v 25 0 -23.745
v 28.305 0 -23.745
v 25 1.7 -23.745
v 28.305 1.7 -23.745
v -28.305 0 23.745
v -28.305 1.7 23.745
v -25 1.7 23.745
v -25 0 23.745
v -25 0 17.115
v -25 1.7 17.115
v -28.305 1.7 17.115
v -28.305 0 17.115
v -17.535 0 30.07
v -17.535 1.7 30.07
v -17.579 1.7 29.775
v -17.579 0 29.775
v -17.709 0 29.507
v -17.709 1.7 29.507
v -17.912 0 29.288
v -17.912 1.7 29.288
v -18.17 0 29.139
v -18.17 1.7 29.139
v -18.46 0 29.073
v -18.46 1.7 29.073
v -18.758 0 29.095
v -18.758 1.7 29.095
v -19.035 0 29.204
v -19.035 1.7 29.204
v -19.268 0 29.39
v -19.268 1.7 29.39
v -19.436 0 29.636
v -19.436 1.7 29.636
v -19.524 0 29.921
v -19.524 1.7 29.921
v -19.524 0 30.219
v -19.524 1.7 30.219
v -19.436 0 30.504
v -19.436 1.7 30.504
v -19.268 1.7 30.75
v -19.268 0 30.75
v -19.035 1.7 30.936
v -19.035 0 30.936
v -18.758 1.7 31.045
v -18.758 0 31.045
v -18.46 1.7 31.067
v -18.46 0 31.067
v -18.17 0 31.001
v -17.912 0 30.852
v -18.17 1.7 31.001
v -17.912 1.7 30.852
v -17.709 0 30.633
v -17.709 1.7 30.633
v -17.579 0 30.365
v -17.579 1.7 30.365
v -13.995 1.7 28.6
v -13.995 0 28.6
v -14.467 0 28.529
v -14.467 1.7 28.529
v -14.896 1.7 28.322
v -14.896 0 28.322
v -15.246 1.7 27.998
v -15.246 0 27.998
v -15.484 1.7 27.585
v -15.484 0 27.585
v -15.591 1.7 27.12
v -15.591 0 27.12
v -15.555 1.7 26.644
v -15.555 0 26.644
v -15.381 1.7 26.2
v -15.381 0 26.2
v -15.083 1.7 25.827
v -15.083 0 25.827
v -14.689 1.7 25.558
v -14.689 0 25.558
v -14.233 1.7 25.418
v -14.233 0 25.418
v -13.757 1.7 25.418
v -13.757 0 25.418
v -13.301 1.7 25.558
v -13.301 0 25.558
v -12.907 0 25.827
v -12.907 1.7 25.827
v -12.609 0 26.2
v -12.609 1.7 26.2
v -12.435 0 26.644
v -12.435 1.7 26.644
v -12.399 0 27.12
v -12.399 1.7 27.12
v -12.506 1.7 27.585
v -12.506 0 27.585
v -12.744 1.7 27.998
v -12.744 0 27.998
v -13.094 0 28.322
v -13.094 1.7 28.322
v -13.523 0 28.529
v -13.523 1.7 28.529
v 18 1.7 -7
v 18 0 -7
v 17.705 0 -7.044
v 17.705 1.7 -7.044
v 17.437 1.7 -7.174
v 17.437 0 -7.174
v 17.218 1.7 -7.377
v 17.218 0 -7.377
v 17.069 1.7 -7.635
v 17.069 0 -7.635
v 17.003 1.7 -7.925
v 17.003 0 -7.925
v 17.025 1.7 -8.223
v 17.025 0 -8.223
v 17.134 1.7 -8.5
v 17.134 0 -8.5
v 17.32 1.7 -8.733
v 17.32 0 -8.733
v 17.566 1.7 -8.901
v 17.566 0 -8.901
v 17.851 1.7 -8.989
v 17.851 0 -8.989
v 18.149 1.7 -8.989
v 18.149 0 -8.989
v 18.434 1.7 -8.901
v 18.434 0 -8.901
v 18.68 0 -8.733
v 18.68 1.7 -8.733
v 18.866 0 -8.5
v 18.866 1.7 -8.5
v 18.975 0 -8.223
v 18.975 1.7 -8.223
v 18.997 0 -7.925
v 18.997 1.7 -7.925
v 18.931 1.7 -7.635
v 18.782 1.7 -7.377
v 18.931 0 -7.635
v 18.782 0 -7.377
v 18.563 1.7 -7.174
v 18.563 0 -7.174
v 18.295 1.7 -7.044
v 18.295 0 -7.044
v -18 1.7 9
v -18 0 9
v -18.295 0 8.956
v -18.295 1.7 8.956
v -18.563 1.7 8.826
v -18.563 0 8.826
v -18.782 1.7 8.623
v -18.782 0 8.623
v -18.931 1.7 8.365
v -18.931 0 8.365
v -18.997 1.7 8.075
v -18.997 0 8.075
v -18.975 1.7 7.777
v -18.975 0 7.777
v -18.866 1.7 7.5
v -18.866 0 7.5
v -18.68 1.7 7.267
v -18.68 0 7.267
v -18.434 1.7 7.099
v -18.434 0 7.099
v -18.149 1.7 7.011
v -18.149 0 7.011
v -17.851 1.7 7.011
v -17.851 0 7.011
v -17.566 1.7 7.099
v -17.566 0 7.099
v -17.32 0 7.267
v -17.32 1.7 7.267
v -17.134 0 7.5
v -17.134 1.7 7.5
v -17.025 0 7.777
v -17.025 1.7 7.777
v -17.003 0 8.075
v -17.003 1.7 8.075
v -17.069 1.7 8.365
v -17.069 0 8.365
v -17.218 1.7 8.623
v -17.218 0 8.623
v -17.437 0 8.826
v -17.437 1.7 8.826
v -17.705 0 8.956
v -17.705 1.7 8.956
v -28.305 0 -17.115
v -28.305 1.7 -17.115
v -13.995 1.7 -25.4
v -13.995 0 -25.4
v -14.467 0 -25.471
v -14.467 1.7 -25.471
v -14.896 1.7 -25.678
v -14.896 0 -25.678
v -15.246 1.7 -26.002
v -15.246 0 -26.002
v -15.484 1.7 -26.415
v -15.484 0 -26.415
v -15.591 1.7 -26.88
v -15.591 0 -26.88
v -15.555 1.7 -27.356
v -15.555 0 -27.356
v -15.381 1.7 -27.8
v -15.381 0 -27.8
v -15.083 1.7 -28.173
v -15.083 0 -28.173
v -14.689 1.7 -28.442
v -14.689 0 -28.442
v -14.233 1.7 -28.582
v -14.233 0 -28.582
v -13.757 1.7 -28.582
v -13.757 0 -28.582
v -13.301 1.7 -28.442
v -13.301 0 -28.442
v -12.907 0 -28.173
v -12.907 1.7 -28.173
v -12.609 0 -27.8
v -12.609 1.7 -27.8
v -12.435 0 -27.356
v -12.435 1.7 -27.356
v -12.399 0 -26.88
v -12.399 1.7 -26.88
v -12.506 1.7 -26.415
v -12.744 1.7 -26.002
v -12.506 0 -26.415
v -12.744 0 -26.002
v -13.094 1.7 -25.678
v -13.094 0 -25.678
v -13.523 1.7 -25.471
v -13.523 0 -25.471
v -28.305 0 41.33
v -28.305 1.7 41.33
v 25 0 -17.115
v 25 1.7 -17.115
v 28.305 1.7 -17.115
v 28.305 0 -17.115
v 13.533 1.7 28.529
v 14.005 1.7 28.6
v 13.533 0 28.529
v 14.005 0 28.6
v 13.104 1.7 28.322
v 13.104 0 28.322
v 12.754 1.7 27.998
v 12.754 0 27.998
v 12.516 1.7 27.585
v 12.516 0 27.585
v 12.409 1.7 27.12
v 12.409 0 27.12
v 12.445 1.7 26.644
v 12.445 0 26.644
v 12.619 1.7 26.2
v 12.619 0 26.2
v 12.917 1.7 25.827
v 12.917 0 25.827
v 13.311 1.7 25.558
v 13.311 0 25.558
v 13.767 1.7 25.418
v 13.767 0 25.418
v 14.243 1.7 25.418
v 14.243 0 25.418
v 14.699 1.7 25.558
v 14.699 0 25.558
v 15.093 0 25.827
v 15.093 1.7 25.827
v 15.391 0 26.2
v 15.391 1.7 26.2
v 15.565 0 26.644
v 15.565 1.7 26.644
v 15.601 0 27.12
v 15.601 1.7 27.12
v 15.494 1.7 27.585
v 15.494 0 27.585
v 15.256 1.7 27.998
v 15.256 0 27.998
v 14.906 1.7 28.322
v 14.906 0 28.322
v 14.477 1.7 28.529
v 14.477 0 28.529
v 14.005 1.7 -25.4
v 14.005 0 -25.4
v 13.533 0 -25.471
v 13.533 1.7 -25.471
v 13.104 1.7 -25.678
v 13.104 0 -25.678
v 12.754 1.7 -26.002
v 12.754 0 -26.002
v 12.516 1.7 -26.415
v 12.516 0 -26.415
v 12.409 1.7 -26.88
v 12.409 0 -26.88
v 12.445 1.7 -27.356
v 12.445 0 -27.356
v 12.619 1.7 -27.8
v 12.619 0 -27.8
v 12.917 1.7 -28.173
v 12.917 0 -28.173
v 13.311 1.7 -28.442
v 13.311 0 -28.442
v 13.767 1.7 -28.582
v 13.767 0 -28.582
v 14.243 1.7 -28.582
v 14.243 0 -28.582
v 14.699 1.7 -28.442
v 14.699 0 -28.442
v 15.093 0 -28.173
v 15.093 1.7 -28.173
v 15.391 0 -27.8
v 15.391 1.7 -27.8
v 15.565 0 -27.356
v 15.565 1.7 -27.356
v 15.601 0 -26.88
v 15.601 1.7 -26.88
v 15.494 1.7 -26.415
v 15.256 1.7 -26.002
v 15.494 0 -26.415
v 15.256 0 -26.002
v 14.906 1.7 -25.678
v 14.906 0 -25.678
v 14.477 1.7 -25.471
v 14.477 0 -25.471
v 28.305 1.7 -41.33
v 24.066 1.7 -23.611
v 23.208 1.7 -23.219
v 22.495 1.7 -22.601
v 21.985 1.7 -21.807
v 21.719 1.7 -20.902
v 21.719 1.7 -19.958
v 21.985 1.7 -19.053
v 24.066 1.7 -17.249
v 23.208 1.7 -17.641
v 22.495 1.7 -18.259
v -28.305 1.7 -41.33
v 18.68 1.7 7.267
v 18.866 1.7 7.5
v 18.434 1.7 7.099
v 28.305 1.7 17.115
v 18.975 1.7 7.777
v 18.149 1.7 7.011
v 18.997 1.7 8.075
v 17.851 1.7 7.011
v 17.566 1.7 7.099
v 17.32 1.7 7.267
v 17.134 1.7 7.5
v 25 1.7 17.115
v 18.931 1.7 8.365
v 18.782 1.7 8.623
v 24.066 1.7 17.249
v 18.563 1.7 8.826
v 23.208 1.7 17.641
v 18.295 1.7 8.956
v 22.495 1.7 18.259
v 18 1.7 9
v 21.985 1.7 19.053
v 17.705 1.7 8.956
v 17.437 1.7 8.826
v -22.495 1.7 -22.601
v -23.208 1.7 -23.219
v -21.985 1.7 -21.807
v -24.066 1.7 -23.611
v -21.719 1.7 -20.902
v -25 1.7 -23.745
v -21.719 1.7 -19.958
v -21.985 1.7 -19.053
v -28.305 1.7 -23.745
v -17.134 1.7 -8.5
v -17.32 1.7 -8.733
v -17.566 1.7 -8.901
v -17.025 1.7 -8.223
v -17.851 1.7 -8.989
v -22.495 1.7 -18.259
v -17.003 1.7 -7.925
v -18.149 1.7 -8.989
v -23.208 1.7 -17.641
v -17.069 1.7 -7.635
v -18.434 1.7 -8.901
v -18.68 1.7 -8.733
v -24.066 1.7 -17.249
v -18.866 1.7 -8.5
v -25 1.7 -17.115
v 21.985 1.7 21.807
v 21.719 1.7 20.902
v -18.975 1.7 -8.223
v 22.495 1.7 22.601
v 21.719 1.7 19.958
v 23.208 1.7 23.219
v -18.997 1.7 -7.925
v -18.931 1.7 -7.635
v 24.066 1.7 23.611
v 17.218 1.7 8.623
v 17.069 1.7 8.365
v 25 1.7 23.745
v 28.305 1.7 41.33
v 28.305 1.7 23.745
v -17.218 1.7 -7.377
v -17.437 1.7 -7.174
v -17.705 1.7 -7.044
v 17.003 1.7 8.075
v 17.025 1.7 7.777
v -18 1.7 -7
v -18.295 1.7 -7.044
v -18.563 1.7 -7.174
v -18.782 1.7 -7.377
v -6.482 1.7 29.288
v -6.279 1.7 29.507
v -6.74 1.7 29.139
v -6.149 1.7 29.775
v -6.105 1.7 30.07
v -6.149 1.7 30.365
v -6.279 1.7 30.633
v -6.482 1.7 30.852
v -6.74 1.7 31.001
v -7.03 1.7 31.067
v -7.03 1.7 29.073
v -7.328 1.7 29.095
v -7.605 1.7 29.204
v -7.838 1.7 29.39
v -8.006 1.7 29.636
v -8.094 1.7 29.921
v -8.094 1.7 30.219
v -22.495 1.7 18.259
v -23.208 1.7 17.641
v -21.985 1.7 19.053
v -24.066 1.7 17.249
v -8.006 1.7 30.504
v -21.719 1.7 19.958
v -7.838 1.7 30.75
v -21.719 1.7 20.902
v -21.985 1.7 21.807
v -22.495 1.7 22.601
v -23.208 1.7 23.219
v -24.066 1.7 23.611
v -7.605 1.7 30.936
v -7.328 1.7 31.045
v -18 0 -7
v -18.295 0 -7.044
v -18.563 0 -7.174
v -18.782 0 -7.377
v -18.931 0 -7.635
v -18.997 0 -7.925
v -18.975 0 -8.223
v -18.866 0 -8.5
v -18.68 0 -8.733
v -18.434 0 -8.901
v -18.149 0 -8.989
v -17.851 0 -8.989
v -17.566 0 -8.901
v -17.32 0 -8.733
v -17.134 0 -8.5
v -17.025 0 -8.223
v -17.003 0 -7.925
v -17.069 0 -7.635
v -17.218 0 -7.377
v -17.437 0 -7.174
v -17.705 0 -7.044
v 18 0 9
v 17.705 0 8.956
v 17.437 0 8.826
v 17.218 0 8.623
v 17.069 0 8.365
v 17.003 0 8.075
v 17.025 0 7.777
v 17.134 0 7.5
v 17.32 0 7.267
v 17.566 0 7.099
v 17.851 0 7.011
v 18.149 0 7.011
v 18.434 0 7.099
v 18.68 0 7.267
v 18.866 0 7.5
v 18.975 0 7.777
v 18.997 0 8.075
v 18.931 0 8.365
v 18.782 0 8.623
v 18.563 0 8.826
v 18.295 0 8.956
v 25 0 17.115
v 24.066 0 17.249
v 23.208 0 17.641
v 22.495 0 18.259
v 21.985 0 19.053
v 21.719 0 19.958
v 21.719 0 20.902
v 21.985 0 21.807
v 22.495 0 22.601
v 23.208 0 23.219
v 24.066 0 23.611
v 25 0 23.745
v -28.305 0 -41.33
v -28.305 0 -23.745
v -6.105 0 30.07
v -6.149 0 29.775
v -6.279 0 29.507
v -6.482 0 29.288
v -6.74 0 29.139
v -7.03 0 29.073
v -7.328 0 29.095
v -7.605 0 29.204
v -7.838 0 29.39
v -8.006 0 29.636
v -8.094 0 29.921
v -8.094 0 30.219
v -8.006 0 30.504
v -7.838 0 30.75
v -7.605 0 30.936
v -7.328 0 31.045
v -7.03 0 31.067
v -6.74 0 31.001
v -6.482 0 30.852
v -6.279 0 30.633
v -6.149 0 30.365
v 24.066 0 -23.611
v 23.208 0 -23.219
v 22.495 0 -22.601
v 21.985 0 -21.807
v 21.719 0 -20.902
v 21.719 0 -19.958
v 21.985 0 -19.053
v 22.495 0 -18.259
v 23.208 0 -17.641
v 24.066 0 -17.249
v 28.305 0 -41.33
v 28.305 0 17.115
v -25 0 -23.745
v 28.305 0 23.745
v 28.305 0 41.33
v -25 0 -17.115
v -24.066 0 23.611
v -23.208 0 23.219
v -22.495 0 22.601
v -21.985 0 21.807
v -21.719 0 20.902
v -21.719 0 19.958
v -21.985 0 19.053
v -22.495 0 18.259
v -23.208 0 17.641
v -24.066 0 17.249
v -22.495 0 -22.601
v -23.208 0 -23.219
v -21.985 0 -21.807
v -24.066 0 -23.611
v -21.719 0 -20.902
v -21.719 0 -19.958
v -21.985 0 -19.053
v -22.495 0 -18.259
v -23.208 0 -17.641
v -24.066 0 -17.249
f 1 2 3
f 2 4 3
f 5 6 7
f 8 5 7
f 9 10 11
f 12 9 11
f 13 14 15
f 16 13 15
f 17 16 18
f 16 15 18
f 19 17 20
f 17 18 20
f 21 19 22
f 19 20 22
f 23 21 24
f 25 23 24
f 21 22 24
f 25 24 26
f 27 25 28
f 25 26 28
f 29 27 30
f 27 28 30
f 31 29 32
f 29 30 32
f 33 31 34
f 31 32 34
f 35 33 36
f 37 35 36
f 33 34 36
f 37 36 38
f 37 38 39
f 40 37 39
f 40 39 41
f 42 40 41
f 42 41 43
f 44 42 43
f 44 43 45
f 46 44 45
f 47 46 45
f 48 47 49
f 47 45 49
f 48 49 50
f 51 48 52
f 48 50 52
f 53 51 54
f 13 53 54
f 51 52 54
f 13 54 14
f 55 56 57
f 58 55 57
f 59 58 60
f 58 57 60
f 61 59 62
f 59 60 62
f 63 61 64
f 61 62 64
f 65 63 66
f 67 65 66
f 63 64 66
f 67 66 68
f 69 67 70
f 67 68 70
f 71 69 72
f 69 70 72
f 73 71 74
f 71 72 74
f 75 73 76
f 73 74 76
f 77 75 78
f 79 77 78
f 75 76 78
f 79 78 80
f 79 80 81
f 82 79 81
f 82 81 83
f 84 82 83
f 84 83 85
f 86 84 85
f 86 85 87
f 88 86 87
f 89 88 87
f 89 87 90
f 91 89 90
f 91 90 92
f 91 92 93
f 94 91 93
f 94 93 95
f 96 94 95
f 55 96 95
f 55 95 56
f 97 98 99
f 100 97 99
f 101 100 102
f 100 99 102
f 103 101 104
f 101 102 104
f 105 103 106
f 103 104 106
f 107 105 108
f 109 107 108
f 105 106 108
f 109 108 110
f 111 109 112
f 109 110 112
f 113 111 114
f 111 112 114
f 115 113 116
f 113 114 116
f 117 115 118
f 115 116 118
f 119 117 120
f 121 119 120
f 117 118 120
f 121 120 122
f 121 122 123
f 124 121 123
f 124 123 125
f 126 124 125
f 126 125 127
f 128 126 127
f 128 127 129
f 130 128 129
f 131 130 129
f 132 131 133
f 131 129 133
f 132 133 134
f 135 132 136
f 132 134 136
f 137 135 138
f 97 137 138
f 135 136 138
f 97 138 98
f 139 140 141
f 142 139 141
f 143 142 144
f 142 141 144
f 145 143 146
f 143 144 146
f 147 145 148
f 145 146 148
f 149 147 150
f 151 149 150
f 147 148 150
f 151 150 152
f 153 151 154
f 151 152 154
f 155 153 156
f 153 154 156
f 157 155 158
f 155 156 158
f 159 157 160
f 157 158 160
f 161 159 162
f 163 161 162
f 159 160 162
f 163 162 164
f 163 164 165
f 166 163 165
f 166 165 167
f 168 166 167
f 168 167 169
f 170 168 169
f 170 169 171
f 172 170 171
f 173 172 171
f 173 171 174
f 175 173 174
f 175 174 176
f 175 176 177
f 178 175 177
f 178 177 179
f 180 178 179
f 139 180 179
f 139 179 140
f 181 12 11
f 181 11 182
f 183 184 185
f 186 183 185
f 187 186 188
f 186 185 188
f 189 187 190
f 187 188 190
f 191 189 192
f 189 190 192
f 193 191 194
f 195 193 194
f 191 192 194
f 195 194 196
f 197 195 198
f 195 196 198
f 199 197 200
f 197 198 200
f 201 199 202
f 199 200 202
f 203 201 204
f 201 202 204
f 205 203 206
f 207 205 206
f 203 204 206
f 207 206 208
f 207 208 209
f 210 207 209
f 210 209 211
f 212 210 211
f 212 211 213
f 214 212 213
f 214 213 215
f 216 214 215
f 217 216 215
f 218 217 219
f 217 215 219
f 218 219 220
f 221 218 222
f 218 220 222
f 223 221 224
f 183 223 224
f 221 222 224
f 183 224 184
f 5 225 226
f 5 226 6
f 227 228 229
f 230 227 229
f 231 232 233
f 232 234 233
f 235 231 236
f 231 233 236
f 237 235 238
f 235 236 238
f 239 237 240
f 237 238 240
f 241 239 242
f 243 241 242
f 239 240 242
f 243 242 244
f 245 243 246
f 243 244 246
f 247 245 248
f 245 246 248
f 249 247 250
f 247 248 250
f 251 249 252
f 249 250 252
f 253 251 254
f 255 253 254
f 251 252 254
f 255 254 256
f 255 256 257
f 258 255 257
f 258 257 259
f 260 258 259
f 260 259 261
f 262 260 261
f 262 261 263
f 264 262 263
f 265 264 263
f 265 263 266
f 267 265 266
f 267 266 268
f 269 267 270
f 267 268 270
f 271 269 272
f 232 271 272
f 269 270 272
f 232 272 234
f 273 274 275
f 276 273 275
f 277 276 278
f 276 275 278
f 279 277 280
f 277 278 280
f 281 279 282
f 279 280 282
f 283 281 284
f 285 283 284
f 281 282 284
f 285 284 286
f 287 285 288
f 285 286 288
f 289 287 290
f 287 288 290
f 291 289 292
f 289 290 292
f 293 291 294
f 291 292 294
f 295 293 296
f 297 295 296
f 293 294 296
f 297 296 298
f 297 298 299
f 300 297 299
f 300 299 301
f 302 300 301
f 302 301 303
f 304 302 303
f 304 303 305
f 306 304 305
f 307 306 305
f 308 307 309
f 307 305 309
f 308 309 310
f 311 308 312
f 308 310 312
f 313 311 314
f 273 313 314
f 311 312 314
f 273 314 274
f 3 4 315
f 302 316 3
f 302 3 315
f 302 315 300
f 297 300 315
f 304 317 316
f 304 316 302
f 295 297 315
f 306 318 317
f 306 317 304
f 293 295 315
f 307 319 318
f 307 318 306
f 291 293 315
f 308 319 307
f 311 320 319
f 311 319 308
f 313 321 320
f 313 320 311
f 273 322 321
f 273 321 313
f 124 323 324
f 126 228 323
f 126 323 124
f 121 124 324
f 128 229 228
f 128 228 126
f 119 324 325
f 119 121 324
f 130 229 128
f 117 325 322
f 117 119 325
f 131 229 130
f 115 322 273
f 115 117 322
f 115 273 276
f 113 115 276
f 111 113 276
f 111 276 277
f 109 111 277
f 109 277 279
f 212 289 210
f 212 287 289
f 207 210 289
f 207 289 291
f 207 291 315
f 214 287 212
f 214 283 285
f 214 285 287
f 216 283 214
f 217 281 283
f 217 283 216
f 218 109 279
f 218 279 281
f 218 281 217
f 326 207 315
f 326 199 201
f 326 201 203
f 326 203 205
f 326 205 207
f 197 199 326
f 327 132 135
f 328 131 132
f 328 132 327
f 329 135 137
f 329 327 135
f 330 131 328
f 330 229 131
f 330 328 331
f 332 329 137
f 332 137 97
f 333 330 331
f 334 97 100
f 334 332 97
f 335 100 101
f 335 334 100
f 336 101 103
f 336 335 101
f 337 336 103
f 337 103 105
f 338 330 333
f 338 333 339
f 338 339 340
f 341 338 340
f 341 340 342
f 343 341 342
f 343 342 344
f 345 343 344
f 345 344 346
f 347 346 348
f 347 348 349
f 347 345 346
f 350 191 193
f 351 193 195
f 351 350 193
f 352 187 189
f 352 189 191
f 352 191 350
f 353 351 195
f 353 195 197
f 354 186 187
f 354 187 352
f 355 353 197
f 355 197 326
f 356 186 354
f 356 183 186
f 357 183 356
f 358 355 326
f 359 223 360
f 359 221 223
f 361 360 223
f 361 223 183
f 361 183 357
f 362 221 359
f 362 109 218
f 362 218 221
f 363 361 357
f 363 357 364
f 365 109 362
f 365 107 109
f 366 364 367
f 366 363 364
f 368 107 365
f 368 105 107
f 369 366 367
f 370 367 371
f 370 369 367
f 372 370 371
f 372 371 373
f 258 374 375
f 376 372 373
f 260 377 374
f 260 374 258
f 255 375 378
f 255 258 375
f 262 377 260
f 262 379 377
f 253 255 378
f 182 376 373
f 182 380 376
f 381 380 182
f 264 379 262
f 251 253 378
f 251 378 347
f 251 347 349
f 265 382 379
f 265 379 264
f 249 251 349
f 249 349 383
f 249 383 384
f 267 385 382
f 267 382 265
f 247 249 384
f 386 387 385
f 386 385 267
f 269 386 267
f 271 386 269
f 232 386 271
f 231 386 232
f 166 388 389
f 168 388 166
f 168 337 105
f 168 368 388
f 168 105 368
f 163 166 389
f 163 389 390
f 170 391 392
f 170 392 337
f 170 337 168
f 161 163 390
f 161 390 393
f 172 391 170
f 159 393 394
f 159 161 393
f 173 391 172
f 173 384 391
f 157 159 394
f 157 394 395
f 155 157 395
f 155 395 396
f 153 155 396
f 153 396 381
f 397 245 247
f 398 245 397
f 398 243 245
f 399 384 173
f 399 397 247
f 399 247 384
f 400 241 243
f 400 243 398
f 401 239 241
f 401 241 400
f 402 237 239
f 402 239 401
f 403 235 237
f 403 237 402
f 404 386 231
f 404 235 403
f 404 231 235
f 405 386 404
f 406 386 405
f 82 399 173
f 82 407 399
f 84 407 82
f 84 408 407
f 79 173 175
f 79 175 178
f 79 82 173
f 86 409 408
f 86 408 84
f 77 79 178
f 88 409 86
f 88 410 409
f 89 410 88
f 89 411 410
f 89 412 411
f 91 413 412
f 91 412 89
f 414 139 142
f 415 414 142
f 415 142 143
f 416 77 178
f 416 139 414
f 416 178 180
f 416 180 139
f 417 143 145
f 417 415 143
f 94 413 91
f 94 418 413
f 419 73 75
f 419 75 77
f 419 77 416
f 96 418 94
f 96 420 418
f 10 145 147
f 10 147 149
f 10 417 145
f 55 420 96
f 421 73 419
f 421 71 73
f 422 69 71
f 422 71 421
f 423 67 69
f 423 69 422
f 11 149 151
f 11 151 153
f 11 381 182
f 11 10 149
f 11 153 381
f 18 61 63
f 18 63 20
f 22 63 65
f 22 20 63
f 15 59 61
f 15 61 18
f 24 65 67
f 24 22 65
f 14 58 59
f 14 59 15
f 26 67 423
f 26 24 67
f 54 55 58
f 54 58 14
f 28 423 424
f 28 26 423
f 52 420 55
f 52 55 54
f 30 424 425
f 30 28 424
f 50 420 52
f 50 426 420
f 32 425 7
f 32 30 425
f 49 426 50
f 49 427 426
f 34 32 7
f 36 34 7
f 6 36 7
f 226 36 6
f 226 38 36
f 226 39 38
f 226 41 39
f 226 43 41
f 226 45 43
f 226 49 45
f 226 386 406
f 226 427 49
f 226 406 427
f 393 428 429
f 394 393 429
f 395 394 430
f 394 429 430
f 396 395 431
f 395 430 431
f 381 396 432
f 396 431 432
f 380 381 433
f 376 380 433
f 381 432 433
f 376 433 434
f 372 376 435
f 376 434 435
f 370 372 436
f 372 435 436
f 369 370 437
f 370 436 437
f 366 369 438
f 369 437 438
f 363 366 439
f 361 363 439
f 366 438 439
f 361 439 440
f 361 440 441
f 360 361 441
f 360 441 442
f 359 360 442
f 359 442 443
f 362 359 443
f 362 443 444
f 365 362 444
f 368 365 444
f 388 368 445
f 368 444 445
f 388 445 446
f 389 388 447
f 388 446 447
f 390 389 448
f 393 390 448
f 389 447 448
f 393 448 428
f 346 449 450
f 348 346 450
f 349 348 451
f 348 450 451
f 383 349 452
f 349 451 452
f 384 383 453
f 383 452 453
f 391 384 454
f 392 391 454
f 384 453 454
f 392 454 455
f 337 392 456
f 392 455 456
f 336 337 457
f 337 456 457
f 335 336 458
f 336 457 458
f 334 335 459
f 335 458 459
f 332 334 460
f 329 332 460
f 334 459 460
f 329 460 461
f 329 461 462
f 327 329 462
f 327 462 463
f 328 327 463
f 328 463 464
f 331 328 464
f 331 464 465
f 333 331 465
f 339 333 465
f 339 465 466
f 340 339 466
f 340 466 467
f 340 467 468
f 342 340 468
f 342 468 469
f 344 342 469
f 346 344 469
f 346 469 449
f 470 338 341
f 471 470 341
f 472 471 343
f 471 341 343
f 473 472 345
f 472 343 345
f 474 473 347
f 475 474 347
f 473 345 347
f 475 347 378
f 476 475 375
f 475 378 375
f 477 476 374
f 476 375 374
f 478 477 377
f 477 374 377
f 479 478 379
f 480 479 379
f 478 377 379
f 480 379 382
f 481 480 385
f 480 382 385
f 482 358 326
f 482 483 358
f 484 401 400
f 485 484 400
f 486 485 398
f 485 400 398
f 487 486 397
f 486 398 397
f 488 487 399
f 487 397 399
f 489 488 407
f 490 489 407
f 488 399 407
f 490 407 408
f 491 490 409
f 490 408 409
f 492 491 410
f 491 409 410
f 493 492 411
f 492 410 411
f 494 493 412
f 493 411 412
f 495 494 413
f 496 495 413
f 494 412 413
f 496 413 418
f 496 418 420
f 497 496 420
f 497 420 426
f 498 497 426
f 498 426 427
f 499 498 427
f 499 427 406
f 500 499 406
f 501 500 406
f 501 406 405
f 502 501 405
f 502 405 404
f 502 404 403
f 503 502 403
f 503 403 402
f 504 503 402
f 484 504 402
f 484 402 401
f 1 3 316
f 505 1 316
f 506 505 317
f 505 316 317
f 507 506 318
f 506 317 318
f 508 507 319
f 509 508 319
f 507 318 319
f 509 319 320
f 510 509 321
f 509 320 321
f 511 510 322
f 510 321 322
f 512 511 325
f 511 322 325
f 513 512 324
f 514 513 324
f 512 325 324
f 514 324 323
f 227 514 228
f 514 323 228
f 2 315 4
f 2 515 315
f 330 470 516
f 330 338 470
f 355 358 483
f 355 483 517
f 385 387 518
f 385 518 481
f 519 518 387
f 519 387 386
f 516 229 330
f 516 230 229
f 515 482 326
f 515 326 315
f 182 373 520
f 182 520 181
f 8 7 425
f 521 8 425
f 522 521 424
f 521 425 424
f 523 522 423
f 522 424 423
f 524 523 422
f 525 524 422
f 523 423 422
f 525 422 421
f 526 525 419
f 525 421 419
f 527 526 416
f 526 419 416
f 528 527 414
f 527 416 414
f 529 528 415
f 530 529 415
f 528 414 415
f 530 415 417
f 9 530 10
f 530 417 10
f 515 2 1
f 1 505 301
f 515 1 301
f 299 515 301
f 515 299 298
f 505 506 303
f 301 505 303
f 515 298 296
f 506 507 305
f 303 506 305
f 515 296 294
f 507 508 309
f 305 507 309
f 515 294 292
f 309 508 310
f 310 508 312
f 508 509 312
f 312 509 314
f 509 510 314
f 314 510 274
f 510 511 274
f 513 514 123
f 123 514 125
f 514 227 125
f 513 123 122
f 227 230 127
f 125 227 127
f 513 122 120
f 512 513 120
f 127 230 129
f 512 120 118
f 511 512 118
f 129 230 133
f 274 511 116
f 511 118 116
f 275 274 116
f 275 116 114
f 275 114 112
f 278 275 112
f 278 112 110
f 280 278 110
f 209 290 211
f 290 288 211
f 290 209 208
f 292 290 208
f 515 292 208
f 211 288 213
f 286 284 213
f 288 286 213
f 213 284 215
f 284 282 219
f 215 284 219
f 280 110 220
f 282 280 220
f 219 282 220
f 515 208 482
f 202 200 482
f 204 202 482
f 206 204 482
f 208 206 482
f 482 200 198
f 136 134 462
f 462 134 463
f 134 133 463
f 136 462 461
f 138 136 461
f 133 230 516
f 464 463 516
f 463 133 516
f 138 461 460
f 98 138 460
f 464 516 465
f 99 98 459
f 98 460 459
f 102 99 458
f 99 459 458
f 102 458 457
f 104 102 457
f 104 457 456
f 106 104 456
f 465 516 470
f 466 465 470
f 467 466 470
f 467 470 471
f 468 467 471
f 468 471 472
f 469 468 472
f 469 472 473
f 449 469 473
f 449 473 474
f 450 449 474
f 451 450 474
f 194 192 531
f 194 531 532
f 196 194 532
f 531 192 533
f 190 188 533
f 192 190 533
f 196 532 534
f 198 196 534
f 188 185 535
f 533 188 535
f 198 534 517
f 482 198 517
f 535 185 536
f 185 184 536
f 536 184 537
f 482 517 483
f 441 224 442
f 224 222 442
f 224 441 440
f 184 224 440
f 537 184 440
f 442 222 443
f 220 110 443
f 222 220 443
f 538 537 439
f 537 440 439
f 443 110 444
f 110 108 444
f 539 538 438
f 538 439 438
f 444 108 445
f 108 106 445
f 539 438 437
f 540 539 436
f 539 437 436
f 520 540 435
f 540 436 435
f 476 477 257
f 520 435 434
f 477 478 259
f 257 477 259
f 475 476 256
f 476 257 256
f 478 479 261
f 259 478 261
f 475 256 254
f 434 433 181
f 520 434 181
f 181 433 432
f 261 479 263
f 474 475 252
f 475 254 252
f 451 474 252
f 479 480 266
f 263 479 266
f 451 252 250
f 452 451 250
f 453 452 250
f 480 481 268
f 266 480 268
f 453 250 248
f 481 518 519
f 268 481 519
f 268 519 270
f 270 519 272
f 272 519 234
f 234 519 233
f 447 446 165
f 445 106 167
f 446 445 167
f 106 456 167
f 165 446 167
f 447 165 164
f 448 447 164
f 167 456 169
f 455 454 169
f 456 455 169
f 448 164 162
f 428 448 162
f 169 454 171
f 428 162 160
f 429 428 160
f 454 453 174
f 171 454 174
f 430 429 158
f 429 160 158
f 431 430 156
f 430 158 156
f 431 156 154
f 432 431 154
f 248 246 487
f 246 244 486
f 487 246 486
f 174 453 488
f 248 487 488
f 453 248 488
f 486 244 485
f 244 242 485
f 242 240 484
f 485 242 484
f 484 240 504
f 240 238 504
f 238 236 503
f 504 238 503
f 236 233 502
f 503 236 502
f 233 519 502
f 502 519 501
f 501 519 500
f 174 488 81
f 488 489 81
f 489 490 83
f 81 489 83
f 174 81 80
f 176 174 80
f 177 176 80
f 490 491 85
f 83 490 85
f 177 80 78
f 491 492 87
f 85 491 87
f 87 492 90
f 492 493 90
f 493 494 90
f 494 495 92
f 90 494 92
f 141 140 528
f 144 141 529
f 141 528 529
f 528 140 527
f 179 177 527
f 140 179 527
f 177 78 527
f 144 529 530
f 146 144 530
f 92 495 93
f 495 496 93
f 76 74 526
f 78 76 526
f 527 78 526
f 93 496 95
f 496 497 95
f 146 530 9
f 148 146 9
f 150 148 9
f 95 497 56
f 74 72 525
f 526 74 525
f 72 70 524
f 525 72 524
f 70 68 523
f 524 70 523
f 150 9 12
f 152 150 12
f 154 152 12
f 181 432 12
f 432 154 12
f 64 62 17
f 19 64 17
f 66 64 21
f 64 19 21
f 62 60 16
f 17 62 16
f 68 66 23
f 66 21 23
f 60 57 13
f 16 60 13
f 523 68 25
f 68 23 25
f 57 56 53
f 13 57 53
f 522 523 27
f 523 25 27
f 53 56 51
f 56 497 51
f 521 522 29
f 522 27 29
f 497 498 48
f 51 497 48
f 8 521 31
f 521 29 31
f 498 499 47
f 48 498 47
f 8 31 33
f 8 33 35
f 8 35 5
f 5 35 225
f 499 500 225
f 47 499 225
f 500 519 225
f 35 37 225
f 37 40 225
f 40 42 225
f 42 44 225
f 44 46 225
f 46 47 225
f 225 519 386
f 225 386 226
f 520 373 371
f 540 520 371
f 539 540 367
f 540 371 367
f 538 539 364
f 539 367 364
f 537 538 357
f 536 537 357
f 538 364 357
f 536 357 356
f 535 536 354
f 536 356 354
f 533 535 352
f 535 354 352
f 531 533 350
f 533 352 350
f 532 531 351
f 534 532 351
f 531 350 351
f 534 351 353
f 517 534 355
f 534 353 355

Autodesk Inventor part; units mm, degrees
ref_plane "YZ Plane" through (0, 0, 0) normal (1, 0, 0) x (0, 1, 0)
ref_plane "XZ Plane" through (0, 0, 0) normal (0, 1, 0) x (-1, 0, 0)
ref_plane "XY Plane" through (0, 0, 0) normal (0, 0, 1) x (1, 0, 0)
sketch "Sketch1" plane through (0, 0, 0) normal (0, 1, 0) x (-1, 0, 0)
  line L0 (28.305, -41.33) -> (-28.305, -41.33)
  line L1 (-28.305, -41.33) -> (-28.305, 41.33)
  line L2 (-28.305, 41.33) -> (28.305, 41.33)
  line L3 (28.305, 41.33) -> (28.305, -41.33)
  point P0 (0, 0)
  dimension "d0" = 56.61
  dimension "d1" = 82.66
  dimension "d2" = 41.33
  dimension "d3" = 28.305
extrude "Extrusion1" add sketch "Sketch1" along normal blind 1.7
sketch "Sketch2" plane through (0, 1.7, 0) normal (0, 1, 0) x (1, 0, 0)
  line L0 (28.305, 41.33) -> (-28.305, 41.33) projected
  line L1 (28.305, -41.33) -> (28.305, 41.33) projected
  line L2 (25, 20.43) -> (35, 20.43) construction
  line L3 (25, 17.115) -> (35, 17.115)
  line L4 (35, 23.745) -> (25, 23.745)
  arc A0 (25, 23.745) -> (25, 17.115) centre (25, 20.43) ccw
  arc A1 (35, 17.115) -> (35, 23.745) centre (35, 20.43) ccw
  line L5 (0, 0) -> (0, 18.0494) construction
  line L6 (-25, 20.43) -> (-35, 20.43) construction
  line L7 (-25, 17.115) -> (-35, 17.115)
  line L8 (-35, 23.745) -> (-25, 23.745)
  arc A2 (-25, 17.115) -> (-25, 23.745) centre (-25, 20.43) ccw
  arc A3 (-35, 23.745) -> (-35, 17.115) centre (-35, 20.43) ccw
  line L9 (-28.305, -41.33) -> (28.305, -41.33) projected
  line L10 (0, 0) -> (21.685, 0) construction
  line L11 (25, -20.43) -> (35, -20.43) construction
  line L12 (25, -17.115) -> (35, -17.115)
  line L13 (35, -23.745) -> (25, -23.745)
  arc A4 (25, -17.115) -> (25, -23.745) centre (25, -20.43) ccw
  arc A5 (35, -23.745) -> (35, -17.115) centre (35, -20.43) ccw
  line L14 (-25, -20.43) -> (-35, -20.43) construction
  line L15 (-25, -17.115) -> (-35, -17.115)
  line L16 (-35, -23.745) -> (-25, -23.745)
  arc A6 (-25, -23.745) -> (-25, -17.115) centre (-25, -20.43) ccw
  arc A7 (-35, -17.115) -> (-35, -23.745) centre (-35, -20.43) ccw
  point P0 (30, 20.43)
  point P1 (-30, 20.43)
  point P2 (30, -20.43)
  point P3 (-30, -20.43)
  dimension "d6" = 6.63
  dimension "d8" = 6.62
  dimension "d9" = 10
  dimension "d27" = 40.86
  dimension "d28" = 20.9
  dimension "d29" = 20.43
  dimension "d30" = 20.43
  dimension "d31" = 41.33
  dimension "d32" = 41.33
  dimension "d33" = 20.9
extrude "Extrusion2" cut sketch "Sketch2" against normal through all
sketch "Sketch3" plane through (0, 1.7, 0) normal (0, 1, 0) x (1, 0, 0)
  line L0 (-28.305, 17.115) -> (-28.305, -41.33) projected
  line L1 (-28.305, -41.33) -> (28.305, -41.33) projected
  line L2 (-28.305, 41.33) -> (-28.305, 23.745) projected
  point P0 (0, 0)
  point P1 (-13.995, -27)
  point P2 (14.005, -27)
  point P3 (14.005, 27)
  point P4 (-13.995, 27)
  dimension "d12" = 14.31
  dimension "d13" = 14.33
  dimension "d14" = 28
  dimension "d15" = 28
  dimension "d16" = 54
  dimension "d17" = 14.33
  dimension "d18" = 14.31
  dimension "d19" = 54
hole "Hole1" at (-13.995, 1.7, 27) at (14.005, 1.7, 27) at (14.005, 1.7, -27) at (-13.995, 1.7, -27) direction (0, -1, 0) diameter 3.2 end through all
sketch "Sketch4" plane through (0, 1.7, 0) normal (0, 1, 0) x (1, 0, 0)
  line L0 (-28.305, -41.33) -> (28.305, -41.33) projected
  line L1 (28.305, 41.33) -> (-28.305, 41.33) projected
  line L2 (-28.305, 17.115) -> (-28.305, -17.115) projected
  line L3 (18, -8) -> (-18, -8) construction
  line L4 (-18, -8) -> (-18, 8) construction
  line L5 (-18, 8) -> (18, 8) construction
  line L6 (18, 8) -> (18, -8) construction
  line L7 (18, -8) -> (-18, 8) construction
  line L8 (-18, -8) -> (18, 8) construction
  point P0 (0, 0)
  point P1 (0, 0)
  dimension "d34" = 36
  dimension "d35" = 16
  dimension "d36" = 28.305
  dimension "d37" = 56.61
  dimension "d38" = 82.66
  dimension "d39" = 41.33
hole "Hole2" at (-18, 1.7, -8) at (-18, 1.7, 8) at (18, 1.7, 8) at (18, 1.7, -8) direction (0, -1, 0) diameter 2 end through all
sketch "Sketch5" plane through (0, 1.7, 0) normal (0, 1, 0) x (1, 0, 0)
  line L0 (-28.305, -23.745) -> (-28.305, -41.33) projected
  line L1 (-28.305, -41.33) -> (28.305, -41.33) projected
  circle A0 centre (-18.535, -30.07) radius 1
  circle A1 centre (-7.105, -30.07) radius 1
  point P0 (0, 0)
  dimension "d47" = 9.77
  dimension "d48" = 11.26
  dimension "d49" = 21.2
  dimension "d50" = 11.26
  dimension "d51" = 2
  dimension "d52" = 2
  dimension "d53" = 11.43
extrude "Extrusion3" cut sketch "Sketch5" against normal through all
sketch "Sketch6" plane through (0, 1.7, 0) normal (0, 1, 0) x (1, 0, 0)
  line L0 (-28.352, 41.33) -> (28.305, 41.33) construction
  line L1 (28.305, 41.33) -> (28.305, -41.33) construction
  line L2 (28.305, -41.33) -> (-28.352, -41.33) construction
  line L3 (-28.352, -41.33) -> (-28.352, 41.33) construction
  line L4 (28.305, 41.33) -> (-28.305, 41.33) projected
  line L5 (-28.305, -41.33) -> (28.305, -41.33) projected
  line L6 (28.305, -17.115) -> (28.305, 17.115) projected
  point P0 (0, 0)
decal "Decal1"
sketch "Sketch7" plane through (0, 0, 0) normal (0, -1, 0) x (1, 0, 0)
  line L0 (-28.352, 41.33) -> (28.305, 41.33) construction
  line L1 (28.305, 41.33) -> (28.305, -41.33) construction
  line L2 (28.305, -41.33) -> (-28.352, -41.33) construction
  line L3 (-28.352, -41.33) -> (-28.352, 41.33) construction
  line L4 (28.305, 41.33) -> (-28.305, 41.33) projected
  line L5 (-28.305, -41.33) -> (28.305, -41.33) projected
  line L6 (28.305, -17.115) -> (28.305, 17.115) projected
  point P0 (0, 0)
decal "Decal2"
equation "\"d2\" = 0.5 * d1"
equation "\"d3\" = 0.5 * d0"
equation "\"d17\" = d13"
equation "\"d18\" = d12"
equation "\"d19\" = d16"
equation "\"d36\" = 0.5 * d37"
equation "\"d39\" = 0.5 * d38"
equation "\"d52\" = d51"
properties part number "PCB"
